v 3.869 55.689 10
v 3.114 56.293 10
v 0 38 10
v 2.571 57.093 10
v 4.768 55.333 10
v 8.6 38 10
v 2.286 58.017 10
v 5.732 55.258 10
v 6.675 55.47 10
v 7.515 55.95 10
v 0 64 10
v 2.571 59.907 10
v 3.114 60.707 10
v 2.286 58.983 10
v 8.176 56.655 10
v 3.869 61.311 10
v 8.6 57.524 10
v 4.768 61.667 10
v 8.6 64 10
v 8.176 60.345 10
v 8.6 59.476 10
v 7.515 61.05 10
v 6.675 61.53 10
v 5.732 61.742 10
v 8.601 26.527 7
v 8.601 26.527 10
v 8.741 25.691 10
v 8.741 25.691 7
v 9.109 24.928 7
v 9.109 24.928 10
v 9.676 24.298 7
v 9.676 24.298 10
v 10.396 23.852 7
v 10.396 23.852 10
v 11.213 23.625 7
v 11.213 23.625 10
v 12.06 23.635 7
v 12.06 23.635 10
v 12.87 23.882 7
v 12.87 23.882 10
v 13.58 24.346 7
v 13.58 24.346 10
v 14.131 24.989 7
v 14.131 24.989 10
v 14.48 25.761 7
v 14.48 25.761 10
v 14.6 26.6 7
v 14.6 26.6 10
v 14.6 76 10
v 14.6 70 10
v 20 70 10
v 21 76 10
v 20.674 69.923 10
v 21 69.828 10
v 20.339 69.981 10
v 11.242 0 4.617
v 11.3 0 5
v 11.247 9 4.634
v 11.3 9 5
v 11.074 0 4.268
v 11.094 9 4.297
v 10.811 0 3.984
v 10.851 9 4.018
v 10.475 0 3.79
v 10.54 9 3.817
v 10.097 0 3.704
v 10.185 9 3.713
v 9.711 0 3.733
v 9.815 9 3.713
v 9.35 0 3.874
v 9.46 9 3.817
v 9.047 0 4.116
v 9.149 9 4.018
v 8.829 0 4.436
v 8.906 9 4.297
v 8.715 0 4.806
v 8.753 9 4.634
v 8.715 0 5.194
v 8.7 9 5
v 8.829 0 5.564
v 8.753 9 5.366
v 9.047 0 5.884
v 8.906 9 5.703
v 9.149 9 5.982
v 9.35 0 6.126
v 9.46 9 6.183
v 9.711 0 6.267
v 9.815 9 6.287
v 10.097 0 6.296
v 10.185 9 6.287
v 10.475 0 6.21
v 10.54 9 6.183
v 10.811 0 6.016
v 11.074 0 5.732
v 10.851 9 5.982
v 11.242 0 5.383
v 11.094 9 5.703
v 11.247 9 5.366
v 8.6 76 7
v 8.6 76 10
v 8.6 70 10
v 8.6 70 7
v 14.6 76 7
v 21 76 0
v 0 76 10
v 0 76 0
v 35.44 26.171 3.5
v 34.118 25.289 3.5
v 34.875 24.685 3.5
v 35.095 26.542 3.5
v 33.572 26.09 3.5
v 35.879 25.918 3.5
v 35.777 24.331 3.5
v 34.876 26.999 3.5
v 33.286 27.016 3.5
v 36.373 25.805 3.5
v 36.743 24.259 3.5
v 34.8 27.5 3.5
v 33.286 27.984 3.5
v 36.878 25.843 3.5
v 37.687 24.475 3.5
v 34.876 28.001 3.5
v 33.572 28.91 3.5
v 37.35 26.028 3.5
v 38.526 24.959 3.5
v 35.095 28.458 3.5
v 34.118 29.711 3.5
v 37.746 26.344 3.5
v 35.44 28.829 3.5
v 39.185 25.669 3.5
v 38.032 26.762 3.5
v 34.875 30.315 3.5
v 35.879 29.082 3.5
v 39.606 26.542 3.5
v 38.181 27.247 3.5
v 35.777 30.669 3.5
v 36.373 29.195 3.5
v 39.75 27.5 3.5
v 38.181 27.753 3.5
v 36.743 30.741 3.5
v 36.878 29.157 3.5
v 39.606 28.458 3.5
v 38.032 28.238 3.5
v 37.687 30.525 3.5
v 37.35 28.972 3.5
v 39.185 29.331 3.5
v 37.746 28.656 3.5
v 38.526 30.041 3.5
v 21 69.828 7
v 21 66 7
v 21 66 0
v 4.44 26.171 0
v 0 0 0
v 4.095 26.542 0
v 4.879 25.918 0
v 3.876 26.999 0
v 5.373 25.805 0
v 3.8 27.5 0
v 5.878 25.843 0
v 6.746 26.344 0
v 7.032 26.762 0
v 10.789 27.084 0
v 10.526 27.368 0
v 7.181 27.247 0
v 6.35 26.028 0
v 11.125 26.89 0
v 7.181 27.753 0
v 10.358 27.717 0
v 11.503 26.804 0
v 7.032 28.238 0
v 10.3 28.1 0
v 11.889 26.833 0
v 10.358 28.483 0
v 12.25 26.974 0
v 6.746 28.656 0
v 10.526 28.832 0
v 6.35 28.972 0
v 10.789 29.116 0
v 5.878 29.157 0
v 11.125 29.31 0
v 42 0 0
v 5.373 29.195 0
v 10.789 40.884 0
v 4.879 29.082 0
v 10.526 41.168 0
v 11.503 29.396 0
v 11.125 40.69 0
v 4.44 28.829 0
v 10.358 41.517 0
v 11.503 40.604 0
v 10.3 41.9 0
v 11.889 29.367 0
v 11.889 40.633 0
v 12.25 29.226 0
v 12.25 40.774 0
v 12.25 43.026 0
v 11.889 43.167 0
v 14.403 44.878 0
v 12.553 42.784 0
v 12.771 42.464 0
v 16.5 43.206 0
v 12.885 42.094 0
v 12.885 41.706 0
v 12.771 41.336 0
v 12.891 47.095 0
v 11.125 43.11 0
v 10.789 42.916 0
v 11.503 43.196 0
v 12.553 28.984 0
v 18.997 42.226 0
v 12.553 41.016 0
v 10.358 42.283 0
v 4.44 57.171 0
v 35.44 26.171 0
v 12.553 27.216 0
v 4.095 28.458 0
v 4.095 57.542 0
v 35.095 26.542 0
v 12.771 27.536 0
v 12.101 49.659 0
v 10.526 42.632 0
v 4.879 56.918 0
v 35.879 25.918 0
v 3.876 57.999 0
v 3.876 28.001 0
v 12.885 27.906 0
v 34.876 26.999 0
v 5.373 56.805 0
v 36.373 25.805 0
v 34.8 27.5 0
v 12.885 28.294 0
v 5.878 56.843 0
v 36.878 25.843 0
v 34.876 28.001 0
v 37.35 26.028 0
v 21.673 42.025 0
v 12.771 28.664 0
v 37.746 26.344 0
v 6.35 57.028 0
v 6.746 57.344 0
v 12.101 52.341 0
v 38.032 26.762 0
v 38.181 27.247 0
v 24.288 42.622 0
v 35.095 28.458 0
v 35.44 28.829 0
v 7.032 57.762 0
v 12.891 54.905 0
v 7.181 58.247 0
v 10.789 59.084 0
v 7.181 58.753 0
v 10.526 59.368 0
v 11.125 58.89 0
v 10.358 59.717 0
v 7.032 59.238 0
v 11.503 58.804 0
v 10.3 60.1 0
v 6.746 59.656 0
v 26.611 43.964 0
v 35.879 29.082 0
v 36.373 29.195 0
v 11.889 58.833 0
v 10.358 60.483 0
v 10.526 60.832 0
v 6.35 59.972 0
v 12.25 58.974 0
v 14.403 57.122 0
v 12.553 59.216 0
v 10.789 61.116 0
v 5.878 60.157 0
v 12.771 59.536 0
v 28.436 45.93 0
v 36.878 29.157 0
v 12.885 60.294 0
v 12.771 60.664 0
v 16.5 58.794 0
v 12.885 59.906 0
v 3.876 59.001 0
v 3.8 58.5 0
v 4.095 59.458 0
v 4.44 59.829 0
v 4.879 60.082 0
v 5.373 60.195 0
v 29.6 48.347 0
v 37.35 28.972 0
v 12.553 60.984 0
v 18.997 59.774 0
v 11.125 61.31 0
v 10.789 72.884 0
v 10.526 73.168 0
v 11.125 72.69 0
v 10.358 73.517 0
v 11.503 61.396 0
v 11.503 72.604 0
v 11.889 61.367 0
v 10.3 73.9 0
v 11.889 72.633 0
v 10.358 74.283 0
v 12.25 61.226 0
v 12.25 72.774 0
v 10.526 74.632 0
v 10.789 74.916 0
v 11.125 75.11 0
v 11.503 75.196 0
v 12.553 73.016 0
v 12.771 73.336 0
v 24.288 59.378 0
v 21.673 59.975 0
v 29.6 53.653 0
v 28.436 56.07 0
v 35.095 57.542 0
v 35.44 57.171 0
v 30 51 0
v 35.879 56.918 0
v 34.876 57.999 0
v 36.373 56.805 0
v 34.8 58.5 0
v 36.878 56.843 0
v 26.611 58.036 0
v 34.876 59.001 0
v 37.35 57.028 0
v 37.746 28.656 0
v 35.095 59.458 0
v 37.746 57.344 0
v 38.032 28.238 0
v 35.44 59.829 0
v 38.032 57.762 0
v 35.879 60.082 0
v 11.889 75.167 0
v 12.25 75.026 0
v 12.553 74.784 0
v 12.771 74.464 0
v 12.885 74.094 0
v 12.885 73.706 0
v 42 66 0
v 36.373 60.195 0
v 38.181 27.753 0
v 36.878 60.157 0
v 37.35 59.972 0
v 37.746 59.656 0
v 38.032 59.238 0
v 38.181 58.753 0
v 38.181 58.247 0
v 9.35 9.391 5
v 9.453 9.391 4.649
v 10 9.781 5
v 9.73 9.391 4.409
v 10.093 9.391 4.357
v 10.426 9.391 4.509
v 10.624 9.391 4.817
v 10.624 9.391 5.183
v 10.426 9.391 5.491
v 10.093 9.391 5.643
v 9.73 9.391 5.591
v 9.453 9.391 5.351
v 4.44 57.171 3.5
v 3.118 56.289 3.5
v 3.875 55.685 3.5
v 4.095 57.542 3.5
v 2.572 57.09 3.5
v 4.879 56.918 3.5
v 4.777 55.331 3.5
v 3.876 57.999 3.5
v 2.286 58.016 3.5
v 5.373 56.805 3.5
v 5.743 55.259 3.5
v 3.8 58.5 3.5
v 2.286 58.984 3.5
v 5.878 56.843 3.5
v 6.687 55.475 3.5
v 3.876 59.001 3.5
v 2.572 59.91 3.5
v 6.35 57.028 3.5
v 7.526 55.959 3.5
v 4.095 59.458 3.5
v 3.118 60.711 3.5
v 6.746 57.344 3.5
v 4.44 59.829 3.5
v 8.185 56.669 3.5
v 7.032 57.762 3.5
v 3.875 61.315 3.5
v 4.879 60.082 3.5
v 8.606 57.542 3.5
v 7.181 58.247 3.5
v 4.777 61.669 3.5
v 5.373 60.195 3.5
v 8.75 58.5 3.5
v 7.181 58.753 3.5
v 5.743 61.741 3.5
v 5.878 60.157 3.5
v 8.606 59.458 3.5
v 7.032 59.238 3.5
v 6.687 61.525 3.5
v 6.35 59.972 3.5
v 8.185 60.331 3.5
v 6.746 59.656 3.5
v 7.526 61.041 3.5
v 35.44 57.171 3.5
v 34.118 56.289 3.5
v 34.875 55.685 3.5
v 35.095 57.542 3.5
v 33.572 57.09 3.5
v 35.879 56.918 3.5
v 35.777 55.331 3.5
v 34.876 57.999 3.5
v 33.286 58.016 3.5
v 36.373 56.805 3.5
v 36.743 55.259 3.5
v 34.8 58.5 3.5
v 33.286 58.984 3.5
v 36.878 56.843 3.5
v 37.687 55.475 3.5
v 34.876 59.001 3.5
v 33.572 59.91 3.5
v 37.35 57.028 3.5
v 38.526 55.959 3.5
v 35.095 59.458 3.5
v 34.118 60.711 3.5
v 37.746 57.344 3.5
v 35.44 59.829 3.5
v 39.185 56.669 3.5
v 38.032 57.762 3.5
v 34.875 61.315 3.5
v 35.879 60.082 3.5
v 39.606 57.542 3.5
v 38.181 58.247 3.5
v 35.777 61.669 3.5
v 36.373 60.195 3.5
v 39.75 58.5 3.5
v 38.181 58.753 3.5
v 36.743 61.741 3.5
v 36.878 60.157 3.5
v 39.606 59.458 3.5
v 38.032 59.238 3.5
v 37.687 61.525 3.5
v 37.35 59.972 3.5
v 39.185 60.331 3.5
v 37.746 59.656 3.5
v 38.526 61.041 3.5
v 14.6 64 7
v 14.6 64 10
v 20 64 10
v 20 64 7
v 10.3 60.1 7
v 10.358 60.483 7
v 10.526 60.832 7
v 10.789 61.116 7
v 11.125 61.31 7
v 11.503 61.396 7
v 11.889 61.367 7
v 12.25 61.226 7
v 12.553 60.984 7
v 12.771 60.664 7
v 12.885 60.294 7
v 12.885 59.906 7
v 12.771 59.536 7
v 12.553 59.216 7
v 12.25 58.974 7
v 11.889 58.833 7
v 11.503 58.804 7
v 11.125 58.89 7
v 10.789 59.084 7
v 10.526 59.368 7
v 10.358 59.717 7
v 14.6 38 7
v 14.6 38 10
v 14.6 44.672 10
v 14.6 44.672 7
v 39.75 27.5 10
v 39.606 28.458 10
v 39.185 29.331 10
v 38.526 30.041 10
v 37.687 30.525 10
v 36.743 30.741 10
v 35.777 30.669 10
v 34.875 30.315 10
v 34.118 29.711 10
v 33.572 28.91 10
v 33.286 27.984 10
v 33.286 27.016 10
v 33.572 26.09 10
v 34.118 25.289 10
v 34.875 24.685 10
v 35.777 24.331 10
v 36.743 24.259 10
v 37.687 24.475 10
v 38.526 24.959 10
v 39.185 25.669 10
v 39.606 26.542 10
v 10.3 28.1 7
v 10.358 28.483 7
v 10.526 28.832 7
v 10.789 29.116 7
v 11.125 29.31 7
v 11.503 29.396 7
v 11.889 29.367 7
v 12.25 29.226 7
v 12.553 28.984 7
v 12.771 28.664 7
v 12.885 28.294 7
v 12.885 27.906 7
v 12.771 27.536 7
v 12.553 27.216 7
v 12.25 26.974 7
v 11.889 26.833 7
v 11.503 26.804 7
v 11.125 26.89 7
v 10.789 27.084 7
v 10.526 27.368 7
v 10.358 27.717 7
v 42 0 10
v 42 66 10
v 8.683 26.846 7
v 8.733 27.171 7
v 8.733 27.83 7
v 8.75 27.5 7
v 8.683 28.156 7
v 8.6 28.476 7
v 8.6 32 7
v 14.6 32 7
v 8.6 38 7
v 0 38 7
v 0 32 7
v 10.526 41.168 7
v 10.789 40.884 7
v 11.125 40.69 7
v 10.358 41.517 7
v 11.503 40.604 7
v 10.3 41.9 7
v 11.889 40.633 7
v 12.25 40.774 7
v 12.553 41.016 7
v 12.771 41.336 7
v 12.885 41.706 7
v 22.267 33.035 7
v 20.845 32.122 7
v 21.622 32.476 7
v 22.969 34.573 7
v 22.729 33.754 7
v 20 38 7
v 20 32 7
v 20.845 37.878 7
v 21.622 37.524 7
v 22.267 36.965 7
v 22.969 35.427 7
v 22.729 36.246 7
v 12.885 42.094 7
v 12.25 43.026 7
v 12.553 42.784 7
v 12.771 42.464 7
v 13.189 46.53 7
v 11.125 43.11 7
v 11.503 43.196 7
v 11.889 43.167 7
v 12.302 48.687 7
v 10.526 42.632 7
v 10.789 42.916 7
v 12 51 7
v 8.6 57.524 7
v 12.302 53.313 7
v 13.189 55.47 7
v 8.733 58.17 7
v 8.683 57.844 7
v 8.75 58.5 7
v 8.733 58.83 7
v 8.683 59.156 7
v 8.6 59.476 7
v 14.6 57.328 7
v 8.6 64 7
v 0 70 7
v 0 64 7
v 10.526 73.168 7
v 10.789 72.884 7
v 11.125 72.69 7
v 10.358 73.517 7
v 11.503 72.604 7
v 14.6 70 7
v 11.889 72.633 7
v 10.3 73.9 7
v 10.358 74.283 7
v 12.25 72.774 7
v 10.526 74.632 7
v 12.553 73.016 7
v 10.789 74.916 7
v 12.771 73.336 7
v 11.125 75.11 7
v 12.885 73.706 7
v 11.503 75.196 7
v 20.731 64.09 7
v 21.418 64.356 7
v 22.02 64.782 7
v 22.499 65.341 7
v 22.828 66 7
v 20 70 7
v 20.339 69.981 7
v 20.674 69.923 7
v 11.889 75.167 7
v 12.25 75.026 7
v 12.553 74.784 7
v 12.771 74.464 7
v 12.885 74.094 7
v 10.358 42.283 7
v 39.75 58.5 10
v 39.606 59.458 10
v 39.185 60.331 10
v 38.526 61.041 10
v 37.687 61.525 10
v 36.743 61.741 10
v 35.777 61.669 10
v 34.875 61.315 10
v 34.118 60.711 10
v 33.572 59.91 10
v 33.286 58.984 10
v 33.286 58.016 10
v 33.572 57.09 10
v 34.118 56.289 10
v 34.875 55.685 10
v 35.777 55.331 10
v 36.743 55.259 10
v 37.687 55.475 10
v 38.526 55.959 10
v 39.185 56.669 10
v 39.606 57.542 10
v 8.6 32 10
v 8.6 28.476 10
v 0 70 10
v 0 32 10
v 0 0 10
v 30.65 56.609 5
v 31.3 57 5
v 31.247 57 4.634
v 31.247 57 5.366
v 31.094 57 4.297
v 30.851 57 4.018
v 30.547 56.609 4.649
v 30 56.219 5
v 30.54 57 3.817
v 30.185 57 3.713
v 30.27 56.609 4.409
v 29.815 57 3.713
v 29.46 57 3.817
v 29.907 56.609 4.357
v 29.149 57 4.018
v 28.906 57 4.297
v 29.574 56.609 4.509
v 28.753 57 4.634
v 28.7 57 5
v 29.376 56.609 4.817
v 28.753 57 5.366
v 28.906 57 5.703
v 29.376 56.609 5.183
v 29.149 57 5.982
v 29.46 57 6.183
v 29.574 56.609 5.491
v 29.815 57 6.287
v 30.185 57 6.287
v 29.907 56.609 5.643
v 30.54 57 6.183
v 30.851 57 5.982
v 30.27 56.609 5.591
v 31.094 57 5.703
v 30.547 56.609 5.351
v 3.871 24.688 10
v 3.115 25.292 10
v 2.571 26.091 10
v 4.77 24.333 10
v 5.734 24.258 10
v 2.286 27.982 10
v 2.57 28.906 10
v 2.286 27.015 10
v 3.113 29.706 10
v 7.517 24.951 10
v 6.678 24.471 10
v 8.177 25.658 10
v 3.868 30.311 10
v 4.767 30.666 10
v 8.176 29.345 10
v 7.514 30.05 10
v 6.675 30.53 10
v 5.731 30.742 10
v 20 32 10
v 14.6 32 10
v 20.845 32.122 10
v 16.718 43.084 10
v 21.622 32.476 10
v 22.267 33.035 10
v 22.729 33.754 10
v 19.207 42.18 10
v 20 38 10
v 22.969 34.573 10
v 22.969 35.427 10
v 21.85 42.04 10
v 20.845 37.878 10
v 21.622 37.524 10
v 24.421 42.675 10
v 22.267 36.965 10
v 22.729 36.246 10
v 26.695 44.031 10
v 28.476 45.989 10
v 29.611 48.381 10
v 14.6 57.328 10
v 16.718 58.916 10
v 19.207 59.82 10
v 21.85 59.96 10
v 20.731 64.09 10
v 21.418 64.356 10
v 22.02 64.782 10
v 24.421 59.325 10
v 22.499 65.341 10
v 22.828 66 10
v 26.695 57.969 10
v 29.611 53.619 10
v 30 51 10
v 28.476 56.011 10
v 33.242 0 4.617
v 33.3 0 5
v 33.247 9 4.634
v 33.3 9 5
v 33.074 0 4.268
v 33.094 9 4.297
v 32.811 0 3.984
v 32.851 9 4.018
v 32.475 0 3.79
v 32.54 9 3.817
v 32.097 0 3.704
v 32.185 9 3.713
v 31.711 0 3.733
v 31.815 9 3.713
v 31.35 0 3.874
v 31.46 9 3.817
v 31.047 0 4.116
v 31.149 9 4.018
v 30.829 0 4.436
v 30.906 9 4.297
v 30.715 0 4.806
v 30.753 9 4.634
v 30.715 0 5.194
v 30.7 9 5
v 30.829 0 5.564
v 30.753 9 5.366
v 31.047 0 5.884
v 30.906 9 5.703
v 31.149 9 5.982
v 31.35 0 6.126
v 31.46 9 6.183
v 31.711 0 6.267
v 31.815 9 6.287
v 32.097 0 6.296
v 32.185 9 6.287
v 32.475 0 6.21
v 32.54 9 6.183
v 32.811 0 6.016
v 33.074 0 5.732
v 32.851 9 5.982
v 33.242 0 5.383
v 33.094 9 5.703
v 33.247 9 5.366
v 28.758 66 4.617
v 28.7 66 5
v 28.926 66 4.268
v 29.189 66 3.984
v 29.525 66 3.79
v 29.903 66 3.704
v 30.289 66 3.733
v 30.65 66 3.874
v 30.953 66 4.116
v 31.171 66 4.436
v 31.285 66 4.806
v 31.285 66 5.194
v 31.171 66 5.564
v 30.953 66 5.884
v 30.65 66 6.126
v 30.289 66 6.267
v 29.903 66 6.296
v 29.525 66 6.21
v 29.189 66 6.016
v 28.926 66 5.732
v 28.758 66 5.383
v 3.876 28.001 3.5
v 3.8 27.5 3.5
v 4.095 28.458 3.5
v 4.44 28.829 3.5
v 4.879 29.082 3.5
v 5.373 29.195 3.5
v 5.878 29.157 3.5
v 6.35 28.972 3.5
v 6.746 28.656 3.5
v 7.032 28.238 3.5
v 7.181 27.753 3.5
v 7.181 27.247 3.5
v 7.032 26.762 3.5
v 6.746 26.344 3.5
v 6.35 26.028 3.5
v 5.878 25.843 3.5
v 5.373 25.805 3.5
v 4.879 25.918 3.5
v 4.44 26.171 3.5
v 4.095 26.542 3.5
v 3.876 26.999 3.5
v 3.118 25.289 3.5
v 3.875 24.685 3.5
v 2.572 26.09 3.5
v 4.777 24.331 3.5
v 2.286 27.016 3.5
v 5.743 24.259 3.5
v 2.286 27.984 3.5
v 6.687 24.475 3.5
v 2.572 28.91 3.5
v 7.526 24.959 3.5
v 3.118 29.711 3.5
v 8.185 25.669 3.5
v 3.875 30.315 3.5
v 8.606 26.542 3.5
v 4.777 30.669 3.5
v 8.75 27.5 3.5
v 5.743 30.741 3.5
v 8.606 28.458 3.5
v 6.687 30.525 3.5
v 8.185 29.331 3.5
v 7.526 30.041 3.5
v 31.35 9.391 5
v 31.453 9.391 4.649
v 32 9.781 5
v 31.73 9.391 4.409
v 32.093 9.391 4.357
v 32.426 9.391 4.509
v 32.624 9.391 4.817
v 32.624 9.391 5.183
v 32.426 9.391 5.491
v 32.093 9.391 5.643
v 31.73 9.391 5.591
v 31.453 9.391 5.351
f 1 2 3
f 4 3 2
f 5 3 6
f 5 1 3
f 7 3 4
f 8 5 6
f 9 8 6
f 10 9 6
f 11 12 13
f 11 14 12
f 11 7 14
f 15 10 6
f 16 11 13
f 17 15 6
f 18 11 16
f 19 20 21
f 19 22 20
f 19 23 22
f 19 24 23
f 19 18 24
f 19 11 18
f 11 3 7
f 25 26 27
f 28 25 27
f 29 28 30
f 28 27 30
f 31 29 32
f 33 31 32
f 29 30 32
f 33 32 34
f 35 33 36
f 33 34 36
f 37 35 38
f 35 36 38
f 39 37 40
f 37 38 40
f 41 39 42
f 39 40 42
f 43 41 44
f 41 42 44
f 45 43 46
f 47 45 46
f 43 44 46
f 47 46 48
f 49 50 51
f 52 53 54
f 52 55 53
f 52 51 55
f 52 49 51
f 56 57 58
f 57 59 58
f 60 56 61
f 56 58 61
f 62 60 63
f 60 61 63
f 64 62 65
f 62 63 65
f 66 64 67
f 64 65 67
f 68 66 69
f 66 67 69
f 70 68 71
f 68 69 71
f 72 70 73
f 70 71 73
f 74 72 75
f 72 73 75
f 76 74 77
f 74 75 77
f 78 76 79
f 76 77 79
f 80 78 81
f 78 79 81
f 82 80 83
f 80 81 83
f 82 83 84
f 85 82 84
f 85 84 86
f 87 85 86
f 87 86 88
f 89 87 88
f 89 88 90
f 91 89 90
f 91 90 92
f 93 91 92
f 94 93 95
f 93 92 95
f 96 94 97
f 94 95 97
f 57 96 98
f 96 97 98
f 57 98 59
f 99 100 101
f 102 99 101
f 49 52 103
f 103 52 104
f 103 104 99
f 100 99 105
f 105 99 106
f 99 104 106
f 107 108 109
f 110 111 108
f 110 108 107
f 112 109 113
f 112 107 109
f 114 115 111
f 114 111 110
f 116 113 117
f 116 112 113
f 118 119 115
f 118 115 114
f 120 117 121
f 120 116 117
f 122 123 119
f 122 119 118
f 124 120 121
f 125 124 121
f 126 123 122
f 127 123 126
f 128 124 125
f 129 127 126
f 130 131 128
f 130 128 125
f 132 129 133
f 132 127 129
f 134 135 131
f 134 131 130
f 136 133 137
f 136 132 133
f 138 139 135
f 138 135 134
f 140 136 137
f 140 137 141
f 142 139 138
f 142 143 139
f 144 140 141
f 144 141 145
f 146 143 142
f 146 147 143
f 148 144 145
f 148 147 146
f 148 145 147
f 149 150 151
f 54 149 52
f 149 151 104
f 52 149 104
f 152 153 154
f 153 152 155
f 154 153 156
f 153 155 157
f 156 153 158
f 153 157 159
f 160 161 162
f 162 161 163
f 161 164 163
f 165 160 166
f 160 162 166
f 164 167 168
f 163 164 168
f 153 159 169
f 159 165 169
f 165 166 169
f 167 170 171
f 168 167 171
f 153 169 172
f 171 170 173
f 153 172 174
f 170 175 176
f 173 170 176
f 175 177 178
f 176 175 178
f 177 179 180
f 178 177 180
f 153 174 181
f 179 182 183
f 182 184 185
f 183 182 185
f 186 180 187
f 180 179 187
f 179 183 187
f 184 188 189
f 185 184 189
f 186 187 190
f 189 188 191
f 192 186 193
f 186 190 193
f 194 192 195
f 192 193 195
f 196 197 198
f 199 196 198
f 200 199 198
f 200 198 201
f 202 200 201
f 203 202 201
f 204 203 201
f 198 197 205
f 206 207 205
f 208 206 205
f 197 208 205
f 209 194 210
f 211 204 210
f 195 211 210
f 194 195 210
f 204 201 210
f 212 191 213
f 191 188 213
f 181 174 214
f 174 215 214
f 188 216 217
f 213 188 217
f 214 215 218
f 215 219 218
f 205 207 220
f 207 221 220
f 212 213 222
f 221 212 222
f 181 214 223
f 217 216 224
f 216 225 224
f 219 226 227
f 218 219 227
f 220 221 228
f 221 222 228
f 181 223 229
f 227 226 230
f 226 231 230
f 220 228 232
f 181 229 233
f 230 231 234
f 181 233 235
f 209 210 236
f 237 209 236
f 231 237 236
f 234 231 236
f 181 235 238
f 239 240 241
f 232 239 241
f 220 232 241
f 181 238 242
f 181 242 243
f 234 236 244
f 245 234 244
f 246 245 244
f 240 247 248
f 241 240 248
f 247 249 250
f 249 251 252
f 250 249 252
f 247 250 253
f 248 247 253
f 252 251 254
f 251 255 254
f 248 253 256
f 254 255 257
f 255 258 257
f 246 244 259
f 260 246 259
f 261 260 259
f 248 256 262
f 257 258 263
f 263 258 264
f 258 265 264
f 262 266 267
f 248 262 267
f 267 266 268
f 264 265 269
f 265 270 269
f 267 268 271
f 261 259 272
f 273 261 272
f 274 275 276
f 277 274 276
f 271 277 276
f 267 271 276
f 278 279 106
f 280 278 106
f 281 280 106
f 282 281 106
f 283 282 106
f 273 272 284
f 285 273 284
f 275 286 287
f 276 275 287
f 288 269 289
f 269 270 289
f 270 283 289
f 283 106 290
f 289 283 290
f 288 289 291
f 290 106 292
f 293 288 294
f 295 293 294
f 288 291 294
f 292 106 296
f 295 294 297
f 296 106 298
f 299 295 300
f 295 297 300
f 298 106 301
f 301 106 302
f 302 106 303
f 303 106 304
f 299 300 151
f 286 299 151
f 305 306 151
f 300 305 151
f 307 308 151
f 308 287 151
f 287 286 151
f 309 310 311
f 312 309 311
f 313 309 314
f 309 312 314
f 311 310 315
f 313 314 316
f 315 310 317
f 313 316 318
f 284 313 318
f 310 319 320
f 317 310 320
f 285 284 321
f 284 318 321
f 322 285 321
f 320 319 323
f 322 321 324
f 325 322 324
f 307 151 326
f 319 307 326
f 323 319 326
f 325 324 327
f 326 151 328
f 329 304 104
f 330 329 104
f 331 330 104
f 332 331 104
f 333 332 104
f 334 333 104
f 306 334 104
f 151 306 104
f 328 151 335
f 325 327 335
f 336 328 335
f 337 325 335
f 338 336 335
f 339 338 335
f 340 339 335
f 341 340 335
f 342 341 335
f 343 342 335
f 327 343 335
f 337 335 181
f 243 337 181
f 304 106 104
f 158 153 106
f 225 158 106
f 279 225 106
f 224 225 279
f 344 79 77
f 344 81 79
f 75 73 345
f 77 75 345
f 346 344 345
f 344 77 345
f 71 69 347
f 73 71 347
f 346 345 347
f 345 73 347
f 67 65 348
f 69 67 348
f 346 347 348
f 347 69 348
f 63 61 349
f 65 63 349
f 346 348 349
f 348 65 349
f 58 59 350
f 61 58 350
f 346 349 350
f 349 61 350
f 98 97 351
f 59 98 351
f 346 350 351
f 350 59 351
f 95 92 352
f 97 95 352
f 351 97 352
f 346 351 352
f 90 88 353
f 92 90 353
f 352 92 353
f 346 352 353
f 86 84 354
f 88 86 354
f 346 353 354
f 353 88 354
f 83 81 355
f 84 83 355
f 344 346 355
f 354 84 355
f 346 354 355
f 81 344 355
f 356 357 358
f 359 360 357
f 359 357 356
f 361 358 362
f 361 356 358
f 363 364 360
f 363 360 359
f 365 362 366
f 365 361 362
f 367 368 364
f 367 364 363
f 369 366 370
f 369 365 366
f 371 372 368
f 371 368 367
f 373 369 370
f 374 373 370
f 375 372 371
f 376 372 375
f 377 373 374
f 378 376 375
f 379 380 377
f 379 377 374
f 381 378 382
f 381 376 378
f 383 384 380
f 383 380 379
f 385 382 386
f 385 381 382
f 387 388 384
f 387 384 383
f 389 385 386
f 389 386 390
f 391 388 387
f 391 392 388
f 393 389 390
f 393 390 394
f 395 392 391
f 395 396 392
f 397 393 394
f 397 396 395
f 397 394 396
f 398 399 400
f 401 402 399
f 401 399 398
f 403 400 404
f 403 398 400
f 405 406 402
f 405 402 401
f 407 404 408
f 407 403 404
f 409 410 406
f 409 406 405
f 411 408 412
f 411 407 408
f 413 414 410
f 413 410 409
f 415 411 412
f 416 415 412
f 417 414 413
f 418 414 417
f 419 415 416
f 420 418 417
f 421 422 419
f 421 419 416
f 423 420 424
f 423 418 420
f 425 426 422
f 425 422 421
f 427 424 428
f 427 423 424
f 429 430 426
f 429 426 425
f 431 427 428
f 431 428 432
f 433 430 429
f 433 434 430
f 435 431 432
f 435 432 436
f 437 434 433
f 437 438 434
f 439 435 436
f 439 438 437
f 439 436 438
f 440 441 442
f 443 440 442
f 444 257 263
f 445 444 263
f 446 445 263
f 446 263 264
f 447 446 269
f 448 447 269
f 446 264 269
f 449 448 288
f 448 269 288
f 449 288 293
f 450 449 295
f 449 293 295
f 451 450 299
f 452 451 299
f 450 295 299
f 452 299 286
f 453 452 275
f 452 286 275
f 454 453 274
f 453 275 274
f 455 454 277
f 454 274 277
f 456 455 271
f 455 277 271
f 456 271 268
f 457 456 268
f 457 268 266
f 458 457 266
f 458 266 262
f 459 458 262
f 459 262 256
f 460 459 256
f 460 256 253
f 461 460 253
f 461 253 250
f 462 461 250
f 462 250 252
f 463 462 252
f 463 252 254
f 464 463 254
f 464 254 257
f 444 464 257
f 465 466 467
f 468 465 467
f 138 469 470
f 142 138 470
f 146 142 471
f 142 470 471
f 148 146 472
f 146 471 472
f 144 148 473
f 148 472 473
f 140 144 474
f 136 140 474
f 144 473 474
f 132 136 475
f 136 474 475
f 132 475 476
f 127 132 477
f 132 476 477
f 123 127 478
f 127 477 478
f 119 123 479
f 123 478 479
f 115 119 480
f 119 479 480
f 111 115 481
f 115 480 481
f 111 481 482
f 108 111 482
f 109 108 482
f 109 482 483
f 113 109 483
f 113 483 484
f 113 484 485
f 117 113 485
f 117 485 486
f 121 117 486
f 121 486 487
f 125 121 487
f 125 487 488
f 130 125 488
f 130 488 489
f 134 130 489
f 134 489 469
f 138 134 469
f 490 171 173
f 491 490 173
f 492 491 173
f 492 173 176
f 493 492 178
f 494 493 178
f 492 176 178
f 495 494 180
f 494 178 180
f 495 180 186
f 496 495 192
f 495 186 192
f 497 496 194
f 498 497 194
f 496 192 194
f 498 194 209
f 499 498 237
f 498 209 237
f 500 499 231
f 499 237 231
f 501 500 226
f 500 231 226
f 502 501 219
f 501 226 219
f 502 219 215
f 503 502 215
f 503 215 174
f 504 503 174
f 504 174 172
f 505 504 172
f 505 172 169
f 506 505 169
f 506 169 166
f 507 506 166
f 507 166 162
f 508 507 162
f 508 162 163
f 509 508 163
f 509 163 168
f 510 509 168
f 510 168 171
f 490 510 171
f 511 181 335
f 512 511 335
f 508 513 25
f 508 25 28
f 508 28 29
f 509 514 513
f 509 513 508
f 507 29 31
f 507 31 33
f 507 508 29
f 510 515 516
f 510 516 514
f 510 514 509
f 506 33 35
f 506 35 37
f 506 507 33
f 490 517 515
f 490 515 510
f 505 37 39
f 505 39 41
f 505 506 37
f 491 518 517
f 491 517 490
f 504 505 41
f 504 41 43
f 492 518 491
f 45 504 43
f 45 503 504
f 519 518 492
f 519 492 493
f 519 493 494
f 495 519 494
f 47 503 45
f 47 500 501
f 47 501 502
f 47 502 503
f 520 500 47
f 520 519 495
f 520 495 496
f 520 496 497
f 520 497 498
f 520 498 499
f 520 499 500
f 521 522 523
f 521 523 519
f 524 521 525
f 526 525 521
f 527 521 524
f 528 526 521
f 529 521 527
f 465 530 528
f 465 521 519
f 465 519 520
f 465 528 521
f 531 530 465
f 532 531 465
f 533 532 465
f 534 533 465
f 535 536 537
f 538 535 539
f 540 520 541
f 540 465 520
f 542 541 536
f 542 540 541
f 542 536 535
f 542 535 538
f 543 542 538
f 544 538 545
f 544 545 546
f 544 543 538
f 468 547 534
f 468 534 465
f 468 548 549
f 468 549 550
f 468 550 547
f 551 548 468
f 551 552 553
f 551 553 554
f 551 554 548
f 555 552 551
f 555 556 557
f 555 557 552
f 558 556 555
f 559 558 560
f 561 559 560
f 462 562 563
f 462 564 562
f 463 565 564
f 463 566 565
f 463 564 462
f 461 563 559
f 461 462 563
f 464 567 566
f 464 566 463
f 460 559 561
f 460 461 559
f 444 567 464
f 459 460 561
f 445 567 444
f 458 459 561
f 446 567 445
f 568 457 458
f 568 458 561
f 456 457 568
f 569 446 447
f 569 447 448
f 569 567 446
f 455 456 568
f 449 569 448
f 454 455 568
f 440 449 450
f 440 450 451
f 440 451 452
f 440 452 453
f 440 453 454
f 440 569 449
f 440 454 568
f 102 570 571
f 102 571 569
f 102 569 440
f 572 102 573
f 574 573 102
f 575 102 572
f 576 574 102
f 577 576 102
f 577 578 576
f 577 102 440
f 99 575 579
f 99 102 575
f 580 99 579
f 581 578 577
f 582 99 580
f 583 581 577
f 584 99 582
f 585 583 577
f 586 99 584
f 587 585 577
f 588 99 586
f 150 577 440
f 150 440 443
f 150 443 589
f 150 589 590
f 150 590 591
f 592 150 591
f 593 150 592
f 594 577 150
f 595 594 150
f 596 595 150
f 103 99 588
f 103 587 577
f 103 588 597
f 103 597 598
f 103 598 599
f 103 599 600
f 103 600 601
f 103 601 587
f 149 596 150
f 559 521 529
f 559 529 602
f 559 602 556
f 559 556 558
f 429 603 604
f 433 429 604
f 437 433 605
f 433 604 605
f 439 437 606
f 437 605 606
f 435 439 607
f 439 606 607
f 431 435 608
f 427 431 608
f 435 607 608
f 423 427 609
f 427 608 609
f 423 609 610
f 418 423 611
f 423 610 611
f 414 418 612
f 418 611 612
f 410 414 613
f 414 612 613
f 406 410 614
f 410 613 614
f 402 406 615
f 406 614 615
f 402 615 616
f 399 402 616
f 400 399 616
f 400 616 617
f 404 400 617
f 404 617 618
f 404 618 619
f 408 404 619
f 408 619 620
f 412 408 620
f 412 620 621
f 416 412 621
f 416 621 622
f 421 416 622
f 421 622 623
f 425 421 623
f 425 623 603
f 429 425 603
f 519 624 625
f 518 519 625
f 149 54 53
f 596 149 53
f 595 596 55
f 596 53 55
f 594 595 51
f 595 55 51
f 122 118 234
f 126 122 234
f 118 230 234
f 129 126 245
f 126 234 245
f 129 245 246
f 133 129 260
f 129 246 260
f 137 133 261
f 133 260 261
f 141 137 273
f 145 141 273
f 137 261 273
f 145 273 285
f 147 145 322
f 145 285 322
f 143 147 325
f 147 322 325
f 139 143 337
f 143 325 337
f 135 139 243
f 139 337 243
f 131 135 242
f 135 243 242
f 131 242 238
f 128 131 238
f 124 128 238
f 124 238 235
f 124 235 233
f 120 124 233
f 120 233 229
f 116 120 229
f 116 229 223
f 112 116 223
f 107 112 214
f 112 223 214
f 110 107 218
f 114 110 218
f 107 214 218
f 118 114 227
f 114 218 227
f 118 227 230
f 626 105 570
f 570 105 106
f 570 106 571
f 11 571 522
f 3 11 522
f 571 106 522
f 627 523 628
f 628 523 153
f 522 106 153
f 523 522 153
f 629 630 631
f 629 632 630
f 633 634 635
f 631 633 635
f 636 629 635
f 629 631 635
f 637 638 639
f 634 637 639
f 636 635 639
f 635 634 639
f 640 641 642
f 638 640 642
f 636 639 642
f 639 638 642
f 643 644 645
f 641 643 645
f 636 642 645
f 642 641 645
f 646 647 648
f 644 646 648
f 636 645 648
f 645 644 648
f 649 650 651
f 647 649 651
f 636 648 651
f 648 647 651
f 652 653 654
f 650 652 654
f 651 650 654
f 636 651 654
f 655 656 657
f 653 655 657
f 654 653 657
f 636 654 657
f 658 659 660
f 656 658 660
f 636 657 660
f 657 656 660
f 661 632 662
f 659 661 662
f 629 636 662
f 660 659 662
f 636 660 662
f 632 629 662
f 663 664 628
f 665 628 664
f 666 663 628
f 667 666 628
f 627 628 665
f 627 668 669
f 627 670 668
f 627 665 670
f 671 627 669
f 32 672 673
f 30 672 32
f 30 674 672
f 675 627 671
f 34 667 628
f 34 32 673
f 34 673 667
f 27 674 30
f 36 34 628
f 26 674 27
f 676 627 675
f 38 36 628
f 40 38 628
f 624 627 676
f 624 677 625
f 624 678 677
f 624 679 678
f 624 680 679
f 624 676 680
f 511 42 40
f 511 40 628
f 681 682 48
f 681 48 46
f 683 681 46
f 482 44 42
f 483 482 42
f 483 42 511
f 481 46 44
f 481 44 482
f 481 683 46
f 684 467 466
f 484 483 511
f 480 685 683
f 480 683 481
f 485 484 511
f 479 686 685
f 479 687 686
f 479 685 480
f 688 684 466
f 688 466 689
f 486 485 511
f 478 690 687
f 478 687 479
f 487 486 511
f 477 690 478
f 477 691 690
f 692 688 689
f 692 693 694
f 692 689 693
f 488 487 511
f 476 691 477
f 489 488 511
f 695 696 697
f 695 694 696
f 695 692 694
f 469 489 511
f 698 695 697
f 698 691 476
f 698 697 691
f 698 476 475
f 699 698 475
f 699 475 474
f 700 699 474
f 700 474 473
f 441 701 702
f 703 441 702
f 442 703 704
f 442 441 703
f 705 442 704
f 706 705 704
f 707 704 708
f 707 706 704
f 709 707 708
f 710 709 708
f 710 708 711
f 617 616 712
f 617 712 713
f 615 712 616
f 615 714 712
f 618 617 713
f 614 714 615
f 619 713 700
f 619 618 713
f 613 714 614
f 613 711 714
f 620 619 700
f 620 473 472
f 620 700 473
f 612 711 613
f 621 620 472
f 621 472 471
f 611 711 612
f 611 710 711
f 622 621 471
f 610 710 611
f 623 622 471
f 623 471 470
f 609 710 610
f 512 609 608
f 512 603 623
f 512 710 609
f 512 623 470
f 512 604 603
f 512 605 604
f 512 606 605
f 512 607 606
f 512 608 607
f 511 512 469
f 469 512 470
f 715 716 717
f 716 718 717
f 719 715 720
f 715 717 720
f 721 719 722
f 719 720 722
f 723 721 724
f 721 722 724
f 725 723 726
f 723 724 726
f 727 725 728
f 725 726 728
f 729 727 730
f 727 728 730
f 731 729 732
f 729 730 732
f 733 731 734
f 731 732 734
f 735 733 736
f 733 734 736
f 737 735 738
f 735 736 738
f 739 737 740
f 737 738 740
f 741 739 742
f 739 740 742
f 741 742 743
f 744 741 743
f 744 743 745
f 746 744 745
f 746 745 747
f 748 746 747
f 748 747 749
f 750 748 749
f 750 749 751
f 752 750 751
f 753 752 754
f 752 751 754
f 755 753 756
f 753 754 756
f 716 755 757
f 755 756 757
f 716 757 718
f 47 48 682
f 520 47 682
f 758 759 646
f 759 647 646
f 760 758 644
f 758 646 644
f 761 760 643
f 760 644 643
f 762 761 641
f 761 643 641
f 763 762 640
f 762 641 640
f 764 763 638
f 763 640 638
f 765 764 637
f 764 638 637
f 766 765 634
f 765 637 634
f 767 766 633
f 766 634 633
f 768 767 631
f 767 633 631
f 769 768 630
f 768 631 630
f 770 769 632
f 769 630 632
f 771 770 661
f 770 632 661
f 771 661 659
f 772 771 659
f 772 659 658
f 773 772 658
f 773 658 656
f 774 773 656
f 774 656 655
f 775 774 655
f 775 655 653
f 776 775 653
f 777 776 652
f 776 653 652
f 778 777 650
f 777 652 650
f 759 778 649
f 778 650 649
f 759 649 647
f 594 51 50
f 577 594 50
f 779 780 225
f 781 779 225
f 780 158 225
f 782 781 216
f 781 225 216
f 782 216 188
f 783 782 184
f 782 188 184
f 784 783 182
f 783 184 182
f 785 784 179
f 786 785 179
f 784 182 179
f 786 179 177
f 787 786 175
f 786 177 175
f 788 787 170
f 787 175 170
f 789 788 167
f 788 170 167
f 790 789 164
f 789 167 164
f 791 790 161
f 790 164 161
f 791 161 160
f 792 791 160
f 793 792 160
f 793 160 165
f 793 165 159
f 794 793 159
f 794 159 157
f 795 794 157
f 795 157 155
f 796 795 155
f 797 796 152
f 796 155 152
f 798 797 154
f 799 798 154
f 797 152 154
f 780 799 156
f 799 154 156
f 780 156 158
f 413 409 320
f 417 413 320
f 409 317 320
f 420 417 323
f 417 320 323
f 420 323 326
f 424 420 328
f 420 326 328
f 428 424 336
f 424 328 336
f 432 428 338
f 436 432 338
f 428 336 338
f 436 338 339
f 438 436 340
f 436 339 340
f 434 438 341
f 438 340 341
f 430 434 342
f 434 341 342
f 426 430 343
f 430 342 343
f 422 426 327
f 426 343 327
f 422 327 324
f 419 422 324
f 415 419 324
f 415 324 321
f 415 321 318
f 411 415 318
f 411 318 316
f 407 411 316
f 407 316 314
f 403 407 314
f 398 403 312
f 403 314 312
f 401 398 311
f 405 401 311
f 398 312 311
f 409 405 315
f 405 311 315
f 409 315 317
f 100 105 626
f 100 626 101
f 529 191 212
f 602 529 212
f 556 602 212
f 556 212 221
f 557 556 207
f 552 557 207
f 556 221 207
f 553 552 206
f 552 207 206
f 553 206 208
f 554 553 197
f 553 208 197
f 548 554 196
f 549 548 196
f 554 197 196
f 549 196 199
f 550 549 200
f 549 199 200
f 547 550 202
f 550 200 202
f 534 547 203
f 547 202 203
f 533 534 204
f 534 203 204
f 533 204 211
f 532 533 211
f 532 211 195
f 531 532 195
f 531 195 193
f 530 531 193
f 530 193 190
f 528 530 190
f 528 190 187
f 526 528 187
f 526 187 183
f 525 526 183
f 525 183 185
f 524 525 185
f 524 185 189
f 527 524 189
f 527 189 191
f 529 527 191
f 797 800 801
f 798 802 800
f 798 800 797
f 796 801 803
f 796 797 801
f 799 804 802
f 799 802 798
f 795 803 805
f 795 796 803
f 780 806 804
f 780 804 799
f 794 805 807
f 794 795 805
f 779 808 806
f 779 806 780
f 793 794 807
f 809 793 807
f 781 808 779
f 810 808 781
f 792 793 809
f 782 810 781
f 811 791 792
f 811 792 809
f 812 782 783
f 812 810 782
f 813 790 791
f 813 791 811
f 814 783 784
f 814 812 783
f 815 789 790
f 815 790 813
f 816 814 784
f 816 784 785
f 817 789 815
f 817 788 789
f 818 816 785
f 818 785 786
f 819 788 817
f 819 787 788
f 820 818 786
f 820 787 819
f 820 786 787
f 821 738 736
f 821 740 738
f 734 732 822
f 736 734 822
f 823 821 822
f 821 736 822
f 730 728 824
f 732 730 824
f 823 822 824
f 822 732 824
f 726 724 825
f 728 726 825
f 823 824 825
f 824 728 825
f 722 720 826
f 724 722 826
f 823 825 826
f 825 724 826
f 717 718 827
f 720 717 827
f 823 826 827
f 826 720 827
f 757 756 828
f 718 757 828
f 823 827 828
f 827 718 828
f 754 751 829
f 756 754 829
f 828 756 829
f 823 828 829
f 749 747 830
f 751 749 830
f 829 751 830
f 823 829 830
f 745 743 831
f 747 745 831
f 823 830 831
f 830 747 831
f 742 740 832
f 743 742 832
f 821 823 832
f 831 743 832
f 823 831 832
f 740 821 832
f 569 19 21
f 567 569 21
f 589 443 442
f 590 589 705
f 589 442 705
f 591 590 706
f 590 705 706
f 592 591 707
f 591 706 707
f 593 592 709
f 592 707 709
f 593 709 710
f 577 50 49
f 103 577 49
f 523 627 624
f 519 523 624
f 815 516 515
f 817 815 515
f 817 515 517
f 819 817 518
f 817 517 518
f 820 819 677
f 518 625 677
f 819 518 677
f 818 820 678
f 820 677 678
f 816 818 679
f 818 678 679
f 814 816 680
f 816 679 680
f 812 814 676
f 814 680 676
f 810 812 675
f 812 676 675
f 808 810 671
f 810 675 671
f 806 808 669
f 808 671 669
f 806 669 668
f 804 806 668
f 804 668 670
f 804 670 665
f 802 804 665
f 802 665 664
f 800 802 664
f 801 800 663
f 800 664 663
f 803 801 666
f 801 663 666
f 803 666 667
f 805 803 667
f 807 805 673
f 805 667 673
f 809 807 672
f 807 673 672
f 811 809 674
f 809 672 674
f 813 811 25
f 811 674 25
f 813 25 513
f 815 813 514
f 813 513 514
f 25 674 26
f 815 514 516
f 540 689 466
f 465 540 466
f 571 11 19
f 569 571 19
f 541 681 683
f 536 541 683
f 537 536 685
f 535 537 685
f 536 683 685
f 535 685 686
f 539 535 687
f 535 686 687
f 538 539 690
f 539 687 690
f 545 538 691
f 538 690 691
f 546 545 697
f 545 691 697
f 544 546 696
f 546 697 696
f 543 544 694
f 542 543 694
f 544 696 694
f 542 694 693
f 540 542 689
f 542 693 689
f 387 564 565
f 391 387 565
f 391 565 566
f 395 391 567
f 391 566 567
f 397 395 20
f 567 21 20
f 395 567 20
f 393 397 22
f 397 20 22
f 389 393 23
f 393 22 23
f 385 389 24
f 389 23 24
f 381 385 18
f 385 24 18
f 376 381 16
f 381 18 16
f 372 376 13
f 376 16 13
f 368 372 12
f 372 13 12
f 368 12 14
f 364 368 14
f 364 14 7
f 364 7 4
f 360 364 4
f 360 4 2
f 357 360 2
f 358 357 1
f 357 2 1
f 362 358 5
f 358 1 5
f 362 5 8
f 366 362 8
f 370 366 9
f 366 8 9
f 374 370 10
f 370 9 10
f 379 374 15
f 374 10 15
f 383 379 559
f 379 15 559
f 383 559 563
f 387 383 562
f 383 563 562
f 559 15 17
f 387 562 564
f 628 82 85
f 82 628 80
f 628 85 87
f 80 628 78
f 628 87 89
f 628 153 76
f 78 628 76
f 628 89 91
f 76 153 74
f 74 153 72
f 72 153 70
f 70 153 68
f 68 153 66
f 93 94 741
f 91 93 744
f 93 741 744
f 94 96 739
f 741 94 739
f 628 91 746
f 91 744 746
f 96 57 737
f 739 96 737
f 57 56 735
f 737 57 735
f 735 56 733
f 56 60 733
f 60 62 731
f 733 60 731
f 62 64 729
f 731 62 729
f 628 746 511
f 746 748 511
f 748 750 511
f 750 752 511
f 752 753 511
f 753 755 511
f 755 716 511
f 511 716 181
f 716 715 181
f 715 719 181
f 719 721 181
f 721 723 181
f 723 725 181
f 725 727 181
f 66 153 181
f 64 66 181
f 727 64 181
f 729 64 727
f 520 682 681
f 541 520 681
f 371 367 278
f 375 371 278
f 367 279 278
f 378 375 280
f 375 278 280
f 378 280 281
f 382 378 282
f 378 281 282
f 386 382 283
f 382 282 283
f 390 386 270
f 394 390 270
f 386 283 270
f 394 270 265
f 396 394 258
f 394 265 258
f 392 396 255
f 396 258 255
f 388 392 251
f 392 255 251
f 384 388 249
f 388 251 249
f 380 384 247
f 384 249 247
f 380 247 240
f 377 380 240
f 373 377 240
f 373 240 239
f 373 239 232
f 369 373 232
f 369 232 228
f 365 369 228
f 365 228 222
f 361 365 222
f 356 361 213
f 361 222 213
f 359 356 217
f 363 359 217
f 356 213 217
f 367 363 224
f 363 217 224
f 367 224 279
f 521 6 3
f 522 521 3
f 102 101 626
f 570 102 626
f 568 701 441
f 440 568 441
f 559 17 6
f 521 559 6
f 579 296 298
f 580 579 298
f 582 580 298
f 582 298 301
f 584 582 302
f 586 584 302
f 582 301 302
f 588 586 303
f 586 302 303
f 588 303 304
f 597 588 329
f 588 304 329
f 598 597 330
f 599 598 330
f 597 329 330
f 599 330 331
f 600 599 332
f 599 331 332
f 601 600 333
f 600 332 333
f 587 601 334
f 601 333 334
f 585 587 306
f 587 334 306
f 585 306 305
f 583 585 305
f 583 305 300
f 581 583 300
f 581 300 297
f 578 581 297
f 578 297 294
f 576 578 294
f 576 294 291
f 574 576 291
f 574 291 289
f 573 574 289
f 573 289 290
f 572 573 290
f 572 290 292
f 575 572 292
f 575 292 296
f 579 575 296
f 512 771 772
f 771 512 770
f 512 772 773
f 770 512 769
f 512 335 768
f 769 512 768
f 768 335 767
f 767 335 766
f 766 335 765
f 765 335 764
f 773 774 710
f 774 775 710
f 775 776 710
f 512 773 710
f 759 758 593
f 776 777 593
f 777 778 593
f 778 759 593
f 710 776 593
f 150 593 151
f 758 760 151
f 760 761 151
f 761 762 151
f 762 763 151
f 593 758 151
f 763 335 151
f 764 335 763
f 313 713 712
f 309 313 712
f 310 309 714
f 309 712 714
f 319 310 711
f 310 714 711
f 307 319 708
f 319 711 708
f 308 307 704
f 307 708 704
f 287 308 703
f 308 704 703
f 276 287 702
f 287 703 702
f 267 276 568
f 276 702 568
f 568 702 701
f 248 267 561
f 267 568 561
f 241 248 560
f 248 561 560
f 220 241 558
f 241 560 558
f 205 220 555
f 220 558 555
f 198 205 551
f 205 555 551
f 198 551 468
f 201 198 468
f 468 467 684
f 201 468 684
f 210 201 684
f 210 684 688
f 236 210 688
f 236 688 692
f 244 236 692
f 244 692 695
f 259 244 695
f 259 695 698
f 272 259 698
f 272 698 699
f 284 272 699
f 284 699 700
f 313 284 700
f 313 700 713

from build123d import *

# Parameters (mm, degrees)
BOSS_EXTRUDE1_DEPTH                      = 10
CUT_EXTRUDE1_REACH                       = 89.407
SKETCH2_R                                = 9
CUT_EXTRUDE2_DEPTH                       = 3
CBORE_FOR_M3_PAN_HEAD_SCREW1_D           = 3.4
CBORE_FOR_M3_PAN_HEAD_SCREW1_CBORE_D     = 6.5
CBORE_FOR_M3_PAN_HEAD_SCREW1_CBORE_DEPTH = 6.5
M3X0_5_TAPPED_HOLE1_D                    = 2.6
M3X0_5_TAPPED_HOLE2_D                    = 2.6
M3X0_5_TAPPED_HOLE2_DEPTH                = 9
M3X0_5_TAPPED_HOLE2_TIP                  = 0.781118805
M3X0_5_TAPPED_HOLE3_D                    = 2.6
M3X0_5_TAPPED_HOLE3_DEPTH                = 9
M3X0_5_TAPPED_HOLE3_TIP                  = 0.781118805


with BuildPart() as part:
    # Sketch1 → Boss-Extrude1 (new body)
    with BuildSketch(Plane.XY):
        Polygon((0, 0), (42, 0), (42, 66), (21, 66), (21, 76), (0, 76), (0, 66), align=None)
    extrude(amount=BOSS_EXTRUDE1_DEPTH)

    # Sketch2 → Cut-Extrude1 (cut, up to next)
    with BuildSketch(Plane.XY.offset(10), mode=Mode.PRIVATE) as cut_extrude1_sk1:
        with Locations((21, 51)):
            Circle(SKETCH2_R)
    cut_extrude1_tool1 = extrude(cut_extrude1_sk1.sketch, amount=-CUT_EXTRUDE1_REACH, mode=Mode.PRIVATE) & part.part
    add(cut_extrude1_tool1.solids().sort_by_distance((21, 51, 10))[0], mode=Mode.SUBTRACT)

    # Sketch3 → Cut-Extrude2 (cut)
    with BuildSketch(Plane.XY.offset(10)):
        with BuildLine():
            Line((8.6, 64), (8.6, 38))
            Line((8.6, 38), (0, 38))
            Line((0, 38), (0, 32))
            Line((0, 32), (8.6, 32))
            Line((8.6, 32), (8.6, 26.6))
            ThreePointArc((8.6, 26.6), (11.6, 23.6), (14.6, 26.6))
            Line((14.6, 26.6), (14.6, 32))
            Line((14.6, 32), (20, 32))
            ThreePointArc((20, 32), (23, 35), (20, 38))
            Line((20, 38), (14.6, 38))
            Line((14.6, 38), (14.6, 64))
            Line((14.6, 64), (20, 64))
            ThreePointArc((20, 64), (23, 67), (20, 70))
            Line((20, 70), (14.6, 70))
            Line((14.6, 70), (14.6, 76))
            Line((14.6, 76), (8.6, 76))
            Line((8.6, 76), (8.6, 70))
            Line((8.6, 70), (0, 70))
            Line((0, 70), (0, 64))
            Line((0, 64), (8.6, 64))
        make_face()
    extrude(amount=-CUT_EXTRUDE2_DEPTH, mode=Mode.SUBTRACT)

    # CBORE for M3 Pan Head Screw1 (through all)
    with Locations(Plane.XY.offset(10)):
        with Locations((5.5, 58.5), (36.5, 58.5), (5.5, 27.5), (36.5, 27.5)):
            CounterBoreHole(CBORE_FOR_M3_PAN_HEAD_SCREW1_D / 2, CBORE_FOR_M3_PAN_HEAD_SCREW1_CBORE_D / 2, CBORE_FOR_M3_PAN_HEAD_SCREW1_CBORE_DEPTH)

    # M3x0.5 Tapped Hole1 (through all)
    with Locations(Plane.XY.offset(7)):
        with Locations((11.6, 73.9), (11.6, 60.1), (11.6, 41.9), (11.6, 28.1)):
            Hole(M3X0_5_TAPPED_HOLE1_D / 2)

    # M3x0.5 Tapped Hole2
    with Locations(Plane(origin=(0, 0, 0), x_dir=(-1, 0, 0), z_dir=(0, -1, 0))):
        with Locations((-32, -5), (-10, -5)):
            Hole(M3X0_5_TAPPED_HOLE2_D / 2, depth=M3X0_5_TAPPED_HOLE2_DEPTH)
            with Locations((0, 0, -(M3X0_5_TAPPED_HOLE2_DEPTH + M3X0_5_TAPPED_HOLE2_TIP / 2))):  # 118° drill point
                Cone(0, M3X0_5_TAPPED_HOLE2_D / 2, M3X0_5_TAPPED_HOLE2_TIP, mode=Mode.SUBTRACT)

    # M3x0.5 Tapped Hole3
    with Locations(Plane(origin=(0, 66, 0), x_dir=(1, 0, 0), z_dir=(0, 1, 0))):
        with Locations((30, -5)):
            Hole(M3X0_5_TAPPED_HOLE3_D / 2, depth=M3X0_5_TAPPED_HOLE3_DEPTH)
            with Locations((0, 0, -(M3X0_5_TAPPED_HOLE3_DEPTH + M3X0_5_TAPPED_HOLE3_TIP / 2))):  # 118° drill point
                Cone(0, M3X0_5_TAPPED_HOLE3_D / 2, M3X0_5_TAPPED_HOLE3_TIP, mode=Mode.SUBTRACT)


solid = part.part
